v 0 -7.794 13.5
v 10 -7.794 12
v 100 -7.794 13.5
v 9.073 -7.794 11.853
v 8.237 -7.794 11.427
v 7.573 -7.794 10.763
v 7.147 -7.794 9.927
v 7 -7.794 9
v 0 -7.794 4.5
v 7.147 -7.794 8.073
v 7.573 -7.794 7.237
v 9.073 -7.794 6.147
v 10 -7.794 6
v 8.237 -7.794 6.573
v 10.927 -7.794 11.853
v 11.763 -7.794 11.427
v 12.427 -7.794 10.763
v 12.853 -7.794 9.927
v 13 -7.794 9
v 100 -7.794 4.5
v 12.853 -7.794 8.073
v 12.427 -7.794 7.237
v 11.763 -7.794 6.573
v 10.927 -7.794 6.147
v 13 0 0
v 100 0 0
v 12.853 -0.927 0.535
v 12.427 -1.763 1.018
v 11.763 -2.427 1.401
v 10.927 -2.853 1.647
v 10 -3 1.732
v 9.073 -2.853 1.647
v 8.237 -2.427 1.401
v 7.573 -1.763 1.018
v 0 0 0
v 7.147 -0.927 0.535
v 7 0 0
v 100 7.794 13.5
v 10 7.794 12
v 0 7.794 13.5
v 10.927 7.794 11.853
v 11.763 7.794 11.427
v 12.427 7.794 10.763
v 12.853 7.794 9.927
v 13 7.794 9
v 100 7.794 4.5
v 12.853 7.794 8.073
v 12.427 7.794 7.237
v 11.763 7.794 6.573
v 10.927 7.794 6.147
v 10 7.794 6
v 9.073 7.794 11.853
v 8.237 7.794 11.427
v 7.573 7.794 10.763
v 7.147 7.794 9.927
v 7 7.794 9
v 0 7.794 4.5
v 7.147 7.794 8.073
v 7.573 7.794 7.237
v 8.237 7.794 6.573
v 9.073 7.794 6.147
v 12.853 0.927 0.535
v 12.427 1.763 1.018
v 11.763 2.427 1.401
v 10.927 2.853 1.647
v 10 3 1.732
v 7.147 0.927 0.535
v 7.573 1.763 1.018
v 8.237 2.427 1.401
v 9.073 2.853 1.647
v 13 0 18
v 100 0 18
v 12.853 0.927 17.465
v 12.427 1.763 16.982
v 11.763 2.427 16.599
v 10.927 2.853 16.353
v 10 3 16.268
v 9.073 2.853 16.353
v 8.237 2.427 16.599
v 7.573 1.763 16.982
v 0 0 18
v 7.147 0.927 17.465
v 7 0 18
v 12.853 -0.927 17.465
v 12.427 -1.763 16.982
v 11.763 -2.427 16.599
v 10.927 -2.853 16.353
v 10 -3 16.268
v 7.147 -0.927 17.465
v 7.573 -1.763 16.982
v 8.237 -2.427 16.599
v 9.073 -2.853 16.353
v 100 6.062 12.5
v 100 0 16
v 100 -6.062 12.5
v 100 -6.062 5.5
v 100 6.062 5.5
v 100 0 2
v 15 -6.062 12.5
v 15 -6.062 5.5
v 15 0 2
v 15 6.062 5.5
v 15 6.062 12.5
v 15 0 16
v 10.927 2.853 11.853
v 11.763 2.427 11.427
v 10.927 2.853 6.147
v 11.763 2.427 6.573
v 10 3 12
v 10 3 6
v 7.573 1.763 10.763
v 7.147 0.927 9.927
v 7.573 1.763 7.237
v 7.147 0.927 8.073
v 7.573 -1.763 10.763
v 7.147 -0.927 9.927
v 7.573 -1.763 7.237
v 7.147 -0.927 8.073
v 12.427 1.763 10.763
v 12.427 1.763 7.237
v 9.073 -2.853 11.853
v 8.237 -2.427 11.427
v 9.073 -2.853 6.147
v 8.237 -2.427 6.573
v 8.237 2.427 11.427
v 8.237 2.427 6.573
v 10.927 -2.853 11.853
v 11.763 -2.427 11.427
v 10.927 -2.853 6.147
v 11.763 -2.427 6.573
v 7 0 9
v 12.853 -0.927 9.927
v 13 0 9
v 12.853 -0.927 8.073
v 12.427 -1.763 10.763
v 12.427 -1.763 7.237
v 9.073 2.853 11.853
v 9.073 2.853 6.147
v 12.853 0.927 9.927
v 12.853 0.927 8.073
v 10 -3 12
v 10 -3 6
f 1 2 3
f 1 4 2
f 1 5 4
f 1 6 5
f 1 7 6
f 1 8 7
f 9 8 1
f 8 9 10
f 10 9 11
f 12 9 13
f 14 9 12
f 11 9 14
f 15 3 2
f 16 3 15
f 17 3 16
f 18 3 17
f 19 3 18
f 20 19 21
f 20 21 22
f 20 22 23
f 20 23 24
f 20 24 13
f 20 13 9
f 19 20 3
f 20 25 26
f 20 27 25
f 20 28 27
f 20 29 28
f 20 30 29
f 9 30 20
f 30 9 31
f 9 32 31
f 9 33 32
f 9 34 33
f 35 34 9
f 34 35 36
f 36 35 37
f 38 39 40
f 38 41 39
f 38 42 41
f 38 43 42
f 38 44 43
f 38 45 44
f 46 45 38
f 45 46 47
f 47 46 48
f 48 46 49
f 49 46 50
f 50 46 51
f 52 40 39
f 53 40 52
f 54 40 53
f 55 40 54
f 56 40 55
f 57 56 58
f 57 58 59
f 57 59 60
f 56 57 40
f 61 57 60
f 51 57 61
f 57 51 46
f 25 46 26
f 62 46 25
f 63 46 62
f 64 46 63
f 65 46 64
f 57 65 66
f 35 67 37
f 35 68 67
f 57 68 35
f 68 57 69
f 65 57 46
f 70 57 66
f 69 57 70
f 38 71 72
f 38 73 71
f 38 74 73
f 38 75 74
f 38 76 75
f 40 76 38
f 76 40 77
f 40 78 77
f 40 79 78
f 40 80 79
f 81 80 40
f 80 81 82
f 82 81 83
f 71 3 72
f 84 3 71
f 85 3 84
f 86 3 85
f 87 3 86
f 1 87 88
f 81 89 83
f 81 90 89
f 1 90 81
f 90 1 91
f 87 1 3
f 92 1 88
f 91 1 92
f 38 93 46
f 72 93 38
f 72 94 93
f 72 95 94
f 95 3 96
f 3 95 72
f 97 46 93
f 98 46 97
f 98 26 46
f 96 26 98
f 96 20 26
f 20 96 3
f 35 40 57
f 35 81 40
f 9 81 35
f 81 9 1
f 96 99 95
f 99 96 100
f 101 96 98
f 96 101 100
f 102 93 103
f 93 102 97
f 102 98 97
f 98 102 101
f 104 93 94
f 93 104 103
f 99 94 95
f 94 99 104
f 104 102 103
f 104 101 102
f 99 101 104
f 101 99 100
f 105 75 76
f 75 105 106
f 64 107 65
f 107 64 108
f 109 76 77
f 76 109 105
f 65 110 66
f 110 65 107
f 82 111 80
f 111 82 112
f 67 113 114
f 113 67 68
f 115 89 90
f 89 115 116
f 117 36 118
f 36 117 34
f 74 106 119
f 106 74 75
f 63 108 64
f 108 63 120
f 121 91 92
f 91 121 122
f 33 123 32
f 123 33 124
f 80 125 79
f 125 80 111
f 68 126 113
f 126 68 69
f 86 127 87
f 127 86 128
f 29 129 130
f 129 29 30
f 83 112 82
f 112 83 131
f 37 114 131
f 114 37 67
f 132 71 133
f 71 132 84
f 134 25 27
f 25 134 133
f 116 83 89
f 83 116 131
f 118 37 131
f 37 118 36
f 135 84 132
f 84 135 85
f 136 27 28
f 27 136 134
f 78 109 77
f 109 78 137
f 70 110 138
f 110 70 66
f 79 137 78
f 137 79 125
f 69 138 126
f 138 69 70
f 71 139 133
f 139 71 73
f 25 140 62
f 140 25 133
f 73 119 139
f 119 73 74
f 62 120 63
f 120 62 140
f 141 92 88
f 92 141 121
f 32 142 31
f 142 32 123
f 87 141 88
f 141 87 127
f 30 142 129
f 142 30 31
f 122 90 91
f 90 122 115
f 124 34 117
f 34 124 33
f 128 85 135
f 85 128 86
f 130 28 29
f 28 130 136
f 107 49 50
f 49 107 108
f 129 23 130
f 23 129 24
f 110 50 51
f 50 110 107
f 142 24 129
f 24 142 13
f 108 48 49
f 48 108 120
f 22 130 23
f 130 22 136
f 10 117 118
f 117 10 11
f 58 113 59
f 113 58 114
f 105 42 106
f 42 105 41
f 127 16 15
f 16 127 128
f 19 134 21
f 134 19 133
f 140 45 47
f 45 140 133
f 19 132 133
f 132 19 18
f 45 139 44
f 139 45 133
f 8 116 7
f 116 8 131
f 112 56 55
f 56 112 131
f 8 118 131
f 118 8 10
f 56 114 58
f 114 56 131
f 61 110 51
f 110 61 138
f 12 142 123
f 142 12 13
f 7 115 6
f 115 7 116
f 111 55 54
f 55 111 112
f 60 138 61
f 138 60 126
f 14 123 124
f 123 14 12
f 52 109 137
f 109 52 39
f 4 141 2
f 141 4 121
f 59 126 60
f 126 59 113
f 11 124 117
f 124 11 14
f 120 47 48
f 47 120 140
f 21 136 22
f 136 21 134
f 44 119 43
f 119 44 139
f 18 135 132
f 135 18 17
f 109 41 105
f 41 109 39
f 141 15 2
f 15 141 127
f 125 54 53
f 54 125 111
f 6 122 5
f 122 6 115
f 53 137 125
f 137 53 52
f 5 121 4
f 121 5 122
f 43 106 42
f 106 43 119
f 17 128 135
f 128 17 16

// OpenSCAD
// Destornillador para fregadero
rotate([0,90,0]){
    translate([-9,0,0]){
        difference(){
            difference(){
                cylinder(h=100,r=9,$fn=6);
                translate([0,0,15])
                    cylinder(h=120,r=7,$fn=6);
            }
            {
                rotate([90,0,90])
                    translate([0,10,-10])
                        cylinder(h=20,r=3,$fn=20);
                rotate([90,0,0])
                    translate([0,10,-10])
                        cylinder(h=20,r=3,$fn=20);
            }
        }
    }
}
